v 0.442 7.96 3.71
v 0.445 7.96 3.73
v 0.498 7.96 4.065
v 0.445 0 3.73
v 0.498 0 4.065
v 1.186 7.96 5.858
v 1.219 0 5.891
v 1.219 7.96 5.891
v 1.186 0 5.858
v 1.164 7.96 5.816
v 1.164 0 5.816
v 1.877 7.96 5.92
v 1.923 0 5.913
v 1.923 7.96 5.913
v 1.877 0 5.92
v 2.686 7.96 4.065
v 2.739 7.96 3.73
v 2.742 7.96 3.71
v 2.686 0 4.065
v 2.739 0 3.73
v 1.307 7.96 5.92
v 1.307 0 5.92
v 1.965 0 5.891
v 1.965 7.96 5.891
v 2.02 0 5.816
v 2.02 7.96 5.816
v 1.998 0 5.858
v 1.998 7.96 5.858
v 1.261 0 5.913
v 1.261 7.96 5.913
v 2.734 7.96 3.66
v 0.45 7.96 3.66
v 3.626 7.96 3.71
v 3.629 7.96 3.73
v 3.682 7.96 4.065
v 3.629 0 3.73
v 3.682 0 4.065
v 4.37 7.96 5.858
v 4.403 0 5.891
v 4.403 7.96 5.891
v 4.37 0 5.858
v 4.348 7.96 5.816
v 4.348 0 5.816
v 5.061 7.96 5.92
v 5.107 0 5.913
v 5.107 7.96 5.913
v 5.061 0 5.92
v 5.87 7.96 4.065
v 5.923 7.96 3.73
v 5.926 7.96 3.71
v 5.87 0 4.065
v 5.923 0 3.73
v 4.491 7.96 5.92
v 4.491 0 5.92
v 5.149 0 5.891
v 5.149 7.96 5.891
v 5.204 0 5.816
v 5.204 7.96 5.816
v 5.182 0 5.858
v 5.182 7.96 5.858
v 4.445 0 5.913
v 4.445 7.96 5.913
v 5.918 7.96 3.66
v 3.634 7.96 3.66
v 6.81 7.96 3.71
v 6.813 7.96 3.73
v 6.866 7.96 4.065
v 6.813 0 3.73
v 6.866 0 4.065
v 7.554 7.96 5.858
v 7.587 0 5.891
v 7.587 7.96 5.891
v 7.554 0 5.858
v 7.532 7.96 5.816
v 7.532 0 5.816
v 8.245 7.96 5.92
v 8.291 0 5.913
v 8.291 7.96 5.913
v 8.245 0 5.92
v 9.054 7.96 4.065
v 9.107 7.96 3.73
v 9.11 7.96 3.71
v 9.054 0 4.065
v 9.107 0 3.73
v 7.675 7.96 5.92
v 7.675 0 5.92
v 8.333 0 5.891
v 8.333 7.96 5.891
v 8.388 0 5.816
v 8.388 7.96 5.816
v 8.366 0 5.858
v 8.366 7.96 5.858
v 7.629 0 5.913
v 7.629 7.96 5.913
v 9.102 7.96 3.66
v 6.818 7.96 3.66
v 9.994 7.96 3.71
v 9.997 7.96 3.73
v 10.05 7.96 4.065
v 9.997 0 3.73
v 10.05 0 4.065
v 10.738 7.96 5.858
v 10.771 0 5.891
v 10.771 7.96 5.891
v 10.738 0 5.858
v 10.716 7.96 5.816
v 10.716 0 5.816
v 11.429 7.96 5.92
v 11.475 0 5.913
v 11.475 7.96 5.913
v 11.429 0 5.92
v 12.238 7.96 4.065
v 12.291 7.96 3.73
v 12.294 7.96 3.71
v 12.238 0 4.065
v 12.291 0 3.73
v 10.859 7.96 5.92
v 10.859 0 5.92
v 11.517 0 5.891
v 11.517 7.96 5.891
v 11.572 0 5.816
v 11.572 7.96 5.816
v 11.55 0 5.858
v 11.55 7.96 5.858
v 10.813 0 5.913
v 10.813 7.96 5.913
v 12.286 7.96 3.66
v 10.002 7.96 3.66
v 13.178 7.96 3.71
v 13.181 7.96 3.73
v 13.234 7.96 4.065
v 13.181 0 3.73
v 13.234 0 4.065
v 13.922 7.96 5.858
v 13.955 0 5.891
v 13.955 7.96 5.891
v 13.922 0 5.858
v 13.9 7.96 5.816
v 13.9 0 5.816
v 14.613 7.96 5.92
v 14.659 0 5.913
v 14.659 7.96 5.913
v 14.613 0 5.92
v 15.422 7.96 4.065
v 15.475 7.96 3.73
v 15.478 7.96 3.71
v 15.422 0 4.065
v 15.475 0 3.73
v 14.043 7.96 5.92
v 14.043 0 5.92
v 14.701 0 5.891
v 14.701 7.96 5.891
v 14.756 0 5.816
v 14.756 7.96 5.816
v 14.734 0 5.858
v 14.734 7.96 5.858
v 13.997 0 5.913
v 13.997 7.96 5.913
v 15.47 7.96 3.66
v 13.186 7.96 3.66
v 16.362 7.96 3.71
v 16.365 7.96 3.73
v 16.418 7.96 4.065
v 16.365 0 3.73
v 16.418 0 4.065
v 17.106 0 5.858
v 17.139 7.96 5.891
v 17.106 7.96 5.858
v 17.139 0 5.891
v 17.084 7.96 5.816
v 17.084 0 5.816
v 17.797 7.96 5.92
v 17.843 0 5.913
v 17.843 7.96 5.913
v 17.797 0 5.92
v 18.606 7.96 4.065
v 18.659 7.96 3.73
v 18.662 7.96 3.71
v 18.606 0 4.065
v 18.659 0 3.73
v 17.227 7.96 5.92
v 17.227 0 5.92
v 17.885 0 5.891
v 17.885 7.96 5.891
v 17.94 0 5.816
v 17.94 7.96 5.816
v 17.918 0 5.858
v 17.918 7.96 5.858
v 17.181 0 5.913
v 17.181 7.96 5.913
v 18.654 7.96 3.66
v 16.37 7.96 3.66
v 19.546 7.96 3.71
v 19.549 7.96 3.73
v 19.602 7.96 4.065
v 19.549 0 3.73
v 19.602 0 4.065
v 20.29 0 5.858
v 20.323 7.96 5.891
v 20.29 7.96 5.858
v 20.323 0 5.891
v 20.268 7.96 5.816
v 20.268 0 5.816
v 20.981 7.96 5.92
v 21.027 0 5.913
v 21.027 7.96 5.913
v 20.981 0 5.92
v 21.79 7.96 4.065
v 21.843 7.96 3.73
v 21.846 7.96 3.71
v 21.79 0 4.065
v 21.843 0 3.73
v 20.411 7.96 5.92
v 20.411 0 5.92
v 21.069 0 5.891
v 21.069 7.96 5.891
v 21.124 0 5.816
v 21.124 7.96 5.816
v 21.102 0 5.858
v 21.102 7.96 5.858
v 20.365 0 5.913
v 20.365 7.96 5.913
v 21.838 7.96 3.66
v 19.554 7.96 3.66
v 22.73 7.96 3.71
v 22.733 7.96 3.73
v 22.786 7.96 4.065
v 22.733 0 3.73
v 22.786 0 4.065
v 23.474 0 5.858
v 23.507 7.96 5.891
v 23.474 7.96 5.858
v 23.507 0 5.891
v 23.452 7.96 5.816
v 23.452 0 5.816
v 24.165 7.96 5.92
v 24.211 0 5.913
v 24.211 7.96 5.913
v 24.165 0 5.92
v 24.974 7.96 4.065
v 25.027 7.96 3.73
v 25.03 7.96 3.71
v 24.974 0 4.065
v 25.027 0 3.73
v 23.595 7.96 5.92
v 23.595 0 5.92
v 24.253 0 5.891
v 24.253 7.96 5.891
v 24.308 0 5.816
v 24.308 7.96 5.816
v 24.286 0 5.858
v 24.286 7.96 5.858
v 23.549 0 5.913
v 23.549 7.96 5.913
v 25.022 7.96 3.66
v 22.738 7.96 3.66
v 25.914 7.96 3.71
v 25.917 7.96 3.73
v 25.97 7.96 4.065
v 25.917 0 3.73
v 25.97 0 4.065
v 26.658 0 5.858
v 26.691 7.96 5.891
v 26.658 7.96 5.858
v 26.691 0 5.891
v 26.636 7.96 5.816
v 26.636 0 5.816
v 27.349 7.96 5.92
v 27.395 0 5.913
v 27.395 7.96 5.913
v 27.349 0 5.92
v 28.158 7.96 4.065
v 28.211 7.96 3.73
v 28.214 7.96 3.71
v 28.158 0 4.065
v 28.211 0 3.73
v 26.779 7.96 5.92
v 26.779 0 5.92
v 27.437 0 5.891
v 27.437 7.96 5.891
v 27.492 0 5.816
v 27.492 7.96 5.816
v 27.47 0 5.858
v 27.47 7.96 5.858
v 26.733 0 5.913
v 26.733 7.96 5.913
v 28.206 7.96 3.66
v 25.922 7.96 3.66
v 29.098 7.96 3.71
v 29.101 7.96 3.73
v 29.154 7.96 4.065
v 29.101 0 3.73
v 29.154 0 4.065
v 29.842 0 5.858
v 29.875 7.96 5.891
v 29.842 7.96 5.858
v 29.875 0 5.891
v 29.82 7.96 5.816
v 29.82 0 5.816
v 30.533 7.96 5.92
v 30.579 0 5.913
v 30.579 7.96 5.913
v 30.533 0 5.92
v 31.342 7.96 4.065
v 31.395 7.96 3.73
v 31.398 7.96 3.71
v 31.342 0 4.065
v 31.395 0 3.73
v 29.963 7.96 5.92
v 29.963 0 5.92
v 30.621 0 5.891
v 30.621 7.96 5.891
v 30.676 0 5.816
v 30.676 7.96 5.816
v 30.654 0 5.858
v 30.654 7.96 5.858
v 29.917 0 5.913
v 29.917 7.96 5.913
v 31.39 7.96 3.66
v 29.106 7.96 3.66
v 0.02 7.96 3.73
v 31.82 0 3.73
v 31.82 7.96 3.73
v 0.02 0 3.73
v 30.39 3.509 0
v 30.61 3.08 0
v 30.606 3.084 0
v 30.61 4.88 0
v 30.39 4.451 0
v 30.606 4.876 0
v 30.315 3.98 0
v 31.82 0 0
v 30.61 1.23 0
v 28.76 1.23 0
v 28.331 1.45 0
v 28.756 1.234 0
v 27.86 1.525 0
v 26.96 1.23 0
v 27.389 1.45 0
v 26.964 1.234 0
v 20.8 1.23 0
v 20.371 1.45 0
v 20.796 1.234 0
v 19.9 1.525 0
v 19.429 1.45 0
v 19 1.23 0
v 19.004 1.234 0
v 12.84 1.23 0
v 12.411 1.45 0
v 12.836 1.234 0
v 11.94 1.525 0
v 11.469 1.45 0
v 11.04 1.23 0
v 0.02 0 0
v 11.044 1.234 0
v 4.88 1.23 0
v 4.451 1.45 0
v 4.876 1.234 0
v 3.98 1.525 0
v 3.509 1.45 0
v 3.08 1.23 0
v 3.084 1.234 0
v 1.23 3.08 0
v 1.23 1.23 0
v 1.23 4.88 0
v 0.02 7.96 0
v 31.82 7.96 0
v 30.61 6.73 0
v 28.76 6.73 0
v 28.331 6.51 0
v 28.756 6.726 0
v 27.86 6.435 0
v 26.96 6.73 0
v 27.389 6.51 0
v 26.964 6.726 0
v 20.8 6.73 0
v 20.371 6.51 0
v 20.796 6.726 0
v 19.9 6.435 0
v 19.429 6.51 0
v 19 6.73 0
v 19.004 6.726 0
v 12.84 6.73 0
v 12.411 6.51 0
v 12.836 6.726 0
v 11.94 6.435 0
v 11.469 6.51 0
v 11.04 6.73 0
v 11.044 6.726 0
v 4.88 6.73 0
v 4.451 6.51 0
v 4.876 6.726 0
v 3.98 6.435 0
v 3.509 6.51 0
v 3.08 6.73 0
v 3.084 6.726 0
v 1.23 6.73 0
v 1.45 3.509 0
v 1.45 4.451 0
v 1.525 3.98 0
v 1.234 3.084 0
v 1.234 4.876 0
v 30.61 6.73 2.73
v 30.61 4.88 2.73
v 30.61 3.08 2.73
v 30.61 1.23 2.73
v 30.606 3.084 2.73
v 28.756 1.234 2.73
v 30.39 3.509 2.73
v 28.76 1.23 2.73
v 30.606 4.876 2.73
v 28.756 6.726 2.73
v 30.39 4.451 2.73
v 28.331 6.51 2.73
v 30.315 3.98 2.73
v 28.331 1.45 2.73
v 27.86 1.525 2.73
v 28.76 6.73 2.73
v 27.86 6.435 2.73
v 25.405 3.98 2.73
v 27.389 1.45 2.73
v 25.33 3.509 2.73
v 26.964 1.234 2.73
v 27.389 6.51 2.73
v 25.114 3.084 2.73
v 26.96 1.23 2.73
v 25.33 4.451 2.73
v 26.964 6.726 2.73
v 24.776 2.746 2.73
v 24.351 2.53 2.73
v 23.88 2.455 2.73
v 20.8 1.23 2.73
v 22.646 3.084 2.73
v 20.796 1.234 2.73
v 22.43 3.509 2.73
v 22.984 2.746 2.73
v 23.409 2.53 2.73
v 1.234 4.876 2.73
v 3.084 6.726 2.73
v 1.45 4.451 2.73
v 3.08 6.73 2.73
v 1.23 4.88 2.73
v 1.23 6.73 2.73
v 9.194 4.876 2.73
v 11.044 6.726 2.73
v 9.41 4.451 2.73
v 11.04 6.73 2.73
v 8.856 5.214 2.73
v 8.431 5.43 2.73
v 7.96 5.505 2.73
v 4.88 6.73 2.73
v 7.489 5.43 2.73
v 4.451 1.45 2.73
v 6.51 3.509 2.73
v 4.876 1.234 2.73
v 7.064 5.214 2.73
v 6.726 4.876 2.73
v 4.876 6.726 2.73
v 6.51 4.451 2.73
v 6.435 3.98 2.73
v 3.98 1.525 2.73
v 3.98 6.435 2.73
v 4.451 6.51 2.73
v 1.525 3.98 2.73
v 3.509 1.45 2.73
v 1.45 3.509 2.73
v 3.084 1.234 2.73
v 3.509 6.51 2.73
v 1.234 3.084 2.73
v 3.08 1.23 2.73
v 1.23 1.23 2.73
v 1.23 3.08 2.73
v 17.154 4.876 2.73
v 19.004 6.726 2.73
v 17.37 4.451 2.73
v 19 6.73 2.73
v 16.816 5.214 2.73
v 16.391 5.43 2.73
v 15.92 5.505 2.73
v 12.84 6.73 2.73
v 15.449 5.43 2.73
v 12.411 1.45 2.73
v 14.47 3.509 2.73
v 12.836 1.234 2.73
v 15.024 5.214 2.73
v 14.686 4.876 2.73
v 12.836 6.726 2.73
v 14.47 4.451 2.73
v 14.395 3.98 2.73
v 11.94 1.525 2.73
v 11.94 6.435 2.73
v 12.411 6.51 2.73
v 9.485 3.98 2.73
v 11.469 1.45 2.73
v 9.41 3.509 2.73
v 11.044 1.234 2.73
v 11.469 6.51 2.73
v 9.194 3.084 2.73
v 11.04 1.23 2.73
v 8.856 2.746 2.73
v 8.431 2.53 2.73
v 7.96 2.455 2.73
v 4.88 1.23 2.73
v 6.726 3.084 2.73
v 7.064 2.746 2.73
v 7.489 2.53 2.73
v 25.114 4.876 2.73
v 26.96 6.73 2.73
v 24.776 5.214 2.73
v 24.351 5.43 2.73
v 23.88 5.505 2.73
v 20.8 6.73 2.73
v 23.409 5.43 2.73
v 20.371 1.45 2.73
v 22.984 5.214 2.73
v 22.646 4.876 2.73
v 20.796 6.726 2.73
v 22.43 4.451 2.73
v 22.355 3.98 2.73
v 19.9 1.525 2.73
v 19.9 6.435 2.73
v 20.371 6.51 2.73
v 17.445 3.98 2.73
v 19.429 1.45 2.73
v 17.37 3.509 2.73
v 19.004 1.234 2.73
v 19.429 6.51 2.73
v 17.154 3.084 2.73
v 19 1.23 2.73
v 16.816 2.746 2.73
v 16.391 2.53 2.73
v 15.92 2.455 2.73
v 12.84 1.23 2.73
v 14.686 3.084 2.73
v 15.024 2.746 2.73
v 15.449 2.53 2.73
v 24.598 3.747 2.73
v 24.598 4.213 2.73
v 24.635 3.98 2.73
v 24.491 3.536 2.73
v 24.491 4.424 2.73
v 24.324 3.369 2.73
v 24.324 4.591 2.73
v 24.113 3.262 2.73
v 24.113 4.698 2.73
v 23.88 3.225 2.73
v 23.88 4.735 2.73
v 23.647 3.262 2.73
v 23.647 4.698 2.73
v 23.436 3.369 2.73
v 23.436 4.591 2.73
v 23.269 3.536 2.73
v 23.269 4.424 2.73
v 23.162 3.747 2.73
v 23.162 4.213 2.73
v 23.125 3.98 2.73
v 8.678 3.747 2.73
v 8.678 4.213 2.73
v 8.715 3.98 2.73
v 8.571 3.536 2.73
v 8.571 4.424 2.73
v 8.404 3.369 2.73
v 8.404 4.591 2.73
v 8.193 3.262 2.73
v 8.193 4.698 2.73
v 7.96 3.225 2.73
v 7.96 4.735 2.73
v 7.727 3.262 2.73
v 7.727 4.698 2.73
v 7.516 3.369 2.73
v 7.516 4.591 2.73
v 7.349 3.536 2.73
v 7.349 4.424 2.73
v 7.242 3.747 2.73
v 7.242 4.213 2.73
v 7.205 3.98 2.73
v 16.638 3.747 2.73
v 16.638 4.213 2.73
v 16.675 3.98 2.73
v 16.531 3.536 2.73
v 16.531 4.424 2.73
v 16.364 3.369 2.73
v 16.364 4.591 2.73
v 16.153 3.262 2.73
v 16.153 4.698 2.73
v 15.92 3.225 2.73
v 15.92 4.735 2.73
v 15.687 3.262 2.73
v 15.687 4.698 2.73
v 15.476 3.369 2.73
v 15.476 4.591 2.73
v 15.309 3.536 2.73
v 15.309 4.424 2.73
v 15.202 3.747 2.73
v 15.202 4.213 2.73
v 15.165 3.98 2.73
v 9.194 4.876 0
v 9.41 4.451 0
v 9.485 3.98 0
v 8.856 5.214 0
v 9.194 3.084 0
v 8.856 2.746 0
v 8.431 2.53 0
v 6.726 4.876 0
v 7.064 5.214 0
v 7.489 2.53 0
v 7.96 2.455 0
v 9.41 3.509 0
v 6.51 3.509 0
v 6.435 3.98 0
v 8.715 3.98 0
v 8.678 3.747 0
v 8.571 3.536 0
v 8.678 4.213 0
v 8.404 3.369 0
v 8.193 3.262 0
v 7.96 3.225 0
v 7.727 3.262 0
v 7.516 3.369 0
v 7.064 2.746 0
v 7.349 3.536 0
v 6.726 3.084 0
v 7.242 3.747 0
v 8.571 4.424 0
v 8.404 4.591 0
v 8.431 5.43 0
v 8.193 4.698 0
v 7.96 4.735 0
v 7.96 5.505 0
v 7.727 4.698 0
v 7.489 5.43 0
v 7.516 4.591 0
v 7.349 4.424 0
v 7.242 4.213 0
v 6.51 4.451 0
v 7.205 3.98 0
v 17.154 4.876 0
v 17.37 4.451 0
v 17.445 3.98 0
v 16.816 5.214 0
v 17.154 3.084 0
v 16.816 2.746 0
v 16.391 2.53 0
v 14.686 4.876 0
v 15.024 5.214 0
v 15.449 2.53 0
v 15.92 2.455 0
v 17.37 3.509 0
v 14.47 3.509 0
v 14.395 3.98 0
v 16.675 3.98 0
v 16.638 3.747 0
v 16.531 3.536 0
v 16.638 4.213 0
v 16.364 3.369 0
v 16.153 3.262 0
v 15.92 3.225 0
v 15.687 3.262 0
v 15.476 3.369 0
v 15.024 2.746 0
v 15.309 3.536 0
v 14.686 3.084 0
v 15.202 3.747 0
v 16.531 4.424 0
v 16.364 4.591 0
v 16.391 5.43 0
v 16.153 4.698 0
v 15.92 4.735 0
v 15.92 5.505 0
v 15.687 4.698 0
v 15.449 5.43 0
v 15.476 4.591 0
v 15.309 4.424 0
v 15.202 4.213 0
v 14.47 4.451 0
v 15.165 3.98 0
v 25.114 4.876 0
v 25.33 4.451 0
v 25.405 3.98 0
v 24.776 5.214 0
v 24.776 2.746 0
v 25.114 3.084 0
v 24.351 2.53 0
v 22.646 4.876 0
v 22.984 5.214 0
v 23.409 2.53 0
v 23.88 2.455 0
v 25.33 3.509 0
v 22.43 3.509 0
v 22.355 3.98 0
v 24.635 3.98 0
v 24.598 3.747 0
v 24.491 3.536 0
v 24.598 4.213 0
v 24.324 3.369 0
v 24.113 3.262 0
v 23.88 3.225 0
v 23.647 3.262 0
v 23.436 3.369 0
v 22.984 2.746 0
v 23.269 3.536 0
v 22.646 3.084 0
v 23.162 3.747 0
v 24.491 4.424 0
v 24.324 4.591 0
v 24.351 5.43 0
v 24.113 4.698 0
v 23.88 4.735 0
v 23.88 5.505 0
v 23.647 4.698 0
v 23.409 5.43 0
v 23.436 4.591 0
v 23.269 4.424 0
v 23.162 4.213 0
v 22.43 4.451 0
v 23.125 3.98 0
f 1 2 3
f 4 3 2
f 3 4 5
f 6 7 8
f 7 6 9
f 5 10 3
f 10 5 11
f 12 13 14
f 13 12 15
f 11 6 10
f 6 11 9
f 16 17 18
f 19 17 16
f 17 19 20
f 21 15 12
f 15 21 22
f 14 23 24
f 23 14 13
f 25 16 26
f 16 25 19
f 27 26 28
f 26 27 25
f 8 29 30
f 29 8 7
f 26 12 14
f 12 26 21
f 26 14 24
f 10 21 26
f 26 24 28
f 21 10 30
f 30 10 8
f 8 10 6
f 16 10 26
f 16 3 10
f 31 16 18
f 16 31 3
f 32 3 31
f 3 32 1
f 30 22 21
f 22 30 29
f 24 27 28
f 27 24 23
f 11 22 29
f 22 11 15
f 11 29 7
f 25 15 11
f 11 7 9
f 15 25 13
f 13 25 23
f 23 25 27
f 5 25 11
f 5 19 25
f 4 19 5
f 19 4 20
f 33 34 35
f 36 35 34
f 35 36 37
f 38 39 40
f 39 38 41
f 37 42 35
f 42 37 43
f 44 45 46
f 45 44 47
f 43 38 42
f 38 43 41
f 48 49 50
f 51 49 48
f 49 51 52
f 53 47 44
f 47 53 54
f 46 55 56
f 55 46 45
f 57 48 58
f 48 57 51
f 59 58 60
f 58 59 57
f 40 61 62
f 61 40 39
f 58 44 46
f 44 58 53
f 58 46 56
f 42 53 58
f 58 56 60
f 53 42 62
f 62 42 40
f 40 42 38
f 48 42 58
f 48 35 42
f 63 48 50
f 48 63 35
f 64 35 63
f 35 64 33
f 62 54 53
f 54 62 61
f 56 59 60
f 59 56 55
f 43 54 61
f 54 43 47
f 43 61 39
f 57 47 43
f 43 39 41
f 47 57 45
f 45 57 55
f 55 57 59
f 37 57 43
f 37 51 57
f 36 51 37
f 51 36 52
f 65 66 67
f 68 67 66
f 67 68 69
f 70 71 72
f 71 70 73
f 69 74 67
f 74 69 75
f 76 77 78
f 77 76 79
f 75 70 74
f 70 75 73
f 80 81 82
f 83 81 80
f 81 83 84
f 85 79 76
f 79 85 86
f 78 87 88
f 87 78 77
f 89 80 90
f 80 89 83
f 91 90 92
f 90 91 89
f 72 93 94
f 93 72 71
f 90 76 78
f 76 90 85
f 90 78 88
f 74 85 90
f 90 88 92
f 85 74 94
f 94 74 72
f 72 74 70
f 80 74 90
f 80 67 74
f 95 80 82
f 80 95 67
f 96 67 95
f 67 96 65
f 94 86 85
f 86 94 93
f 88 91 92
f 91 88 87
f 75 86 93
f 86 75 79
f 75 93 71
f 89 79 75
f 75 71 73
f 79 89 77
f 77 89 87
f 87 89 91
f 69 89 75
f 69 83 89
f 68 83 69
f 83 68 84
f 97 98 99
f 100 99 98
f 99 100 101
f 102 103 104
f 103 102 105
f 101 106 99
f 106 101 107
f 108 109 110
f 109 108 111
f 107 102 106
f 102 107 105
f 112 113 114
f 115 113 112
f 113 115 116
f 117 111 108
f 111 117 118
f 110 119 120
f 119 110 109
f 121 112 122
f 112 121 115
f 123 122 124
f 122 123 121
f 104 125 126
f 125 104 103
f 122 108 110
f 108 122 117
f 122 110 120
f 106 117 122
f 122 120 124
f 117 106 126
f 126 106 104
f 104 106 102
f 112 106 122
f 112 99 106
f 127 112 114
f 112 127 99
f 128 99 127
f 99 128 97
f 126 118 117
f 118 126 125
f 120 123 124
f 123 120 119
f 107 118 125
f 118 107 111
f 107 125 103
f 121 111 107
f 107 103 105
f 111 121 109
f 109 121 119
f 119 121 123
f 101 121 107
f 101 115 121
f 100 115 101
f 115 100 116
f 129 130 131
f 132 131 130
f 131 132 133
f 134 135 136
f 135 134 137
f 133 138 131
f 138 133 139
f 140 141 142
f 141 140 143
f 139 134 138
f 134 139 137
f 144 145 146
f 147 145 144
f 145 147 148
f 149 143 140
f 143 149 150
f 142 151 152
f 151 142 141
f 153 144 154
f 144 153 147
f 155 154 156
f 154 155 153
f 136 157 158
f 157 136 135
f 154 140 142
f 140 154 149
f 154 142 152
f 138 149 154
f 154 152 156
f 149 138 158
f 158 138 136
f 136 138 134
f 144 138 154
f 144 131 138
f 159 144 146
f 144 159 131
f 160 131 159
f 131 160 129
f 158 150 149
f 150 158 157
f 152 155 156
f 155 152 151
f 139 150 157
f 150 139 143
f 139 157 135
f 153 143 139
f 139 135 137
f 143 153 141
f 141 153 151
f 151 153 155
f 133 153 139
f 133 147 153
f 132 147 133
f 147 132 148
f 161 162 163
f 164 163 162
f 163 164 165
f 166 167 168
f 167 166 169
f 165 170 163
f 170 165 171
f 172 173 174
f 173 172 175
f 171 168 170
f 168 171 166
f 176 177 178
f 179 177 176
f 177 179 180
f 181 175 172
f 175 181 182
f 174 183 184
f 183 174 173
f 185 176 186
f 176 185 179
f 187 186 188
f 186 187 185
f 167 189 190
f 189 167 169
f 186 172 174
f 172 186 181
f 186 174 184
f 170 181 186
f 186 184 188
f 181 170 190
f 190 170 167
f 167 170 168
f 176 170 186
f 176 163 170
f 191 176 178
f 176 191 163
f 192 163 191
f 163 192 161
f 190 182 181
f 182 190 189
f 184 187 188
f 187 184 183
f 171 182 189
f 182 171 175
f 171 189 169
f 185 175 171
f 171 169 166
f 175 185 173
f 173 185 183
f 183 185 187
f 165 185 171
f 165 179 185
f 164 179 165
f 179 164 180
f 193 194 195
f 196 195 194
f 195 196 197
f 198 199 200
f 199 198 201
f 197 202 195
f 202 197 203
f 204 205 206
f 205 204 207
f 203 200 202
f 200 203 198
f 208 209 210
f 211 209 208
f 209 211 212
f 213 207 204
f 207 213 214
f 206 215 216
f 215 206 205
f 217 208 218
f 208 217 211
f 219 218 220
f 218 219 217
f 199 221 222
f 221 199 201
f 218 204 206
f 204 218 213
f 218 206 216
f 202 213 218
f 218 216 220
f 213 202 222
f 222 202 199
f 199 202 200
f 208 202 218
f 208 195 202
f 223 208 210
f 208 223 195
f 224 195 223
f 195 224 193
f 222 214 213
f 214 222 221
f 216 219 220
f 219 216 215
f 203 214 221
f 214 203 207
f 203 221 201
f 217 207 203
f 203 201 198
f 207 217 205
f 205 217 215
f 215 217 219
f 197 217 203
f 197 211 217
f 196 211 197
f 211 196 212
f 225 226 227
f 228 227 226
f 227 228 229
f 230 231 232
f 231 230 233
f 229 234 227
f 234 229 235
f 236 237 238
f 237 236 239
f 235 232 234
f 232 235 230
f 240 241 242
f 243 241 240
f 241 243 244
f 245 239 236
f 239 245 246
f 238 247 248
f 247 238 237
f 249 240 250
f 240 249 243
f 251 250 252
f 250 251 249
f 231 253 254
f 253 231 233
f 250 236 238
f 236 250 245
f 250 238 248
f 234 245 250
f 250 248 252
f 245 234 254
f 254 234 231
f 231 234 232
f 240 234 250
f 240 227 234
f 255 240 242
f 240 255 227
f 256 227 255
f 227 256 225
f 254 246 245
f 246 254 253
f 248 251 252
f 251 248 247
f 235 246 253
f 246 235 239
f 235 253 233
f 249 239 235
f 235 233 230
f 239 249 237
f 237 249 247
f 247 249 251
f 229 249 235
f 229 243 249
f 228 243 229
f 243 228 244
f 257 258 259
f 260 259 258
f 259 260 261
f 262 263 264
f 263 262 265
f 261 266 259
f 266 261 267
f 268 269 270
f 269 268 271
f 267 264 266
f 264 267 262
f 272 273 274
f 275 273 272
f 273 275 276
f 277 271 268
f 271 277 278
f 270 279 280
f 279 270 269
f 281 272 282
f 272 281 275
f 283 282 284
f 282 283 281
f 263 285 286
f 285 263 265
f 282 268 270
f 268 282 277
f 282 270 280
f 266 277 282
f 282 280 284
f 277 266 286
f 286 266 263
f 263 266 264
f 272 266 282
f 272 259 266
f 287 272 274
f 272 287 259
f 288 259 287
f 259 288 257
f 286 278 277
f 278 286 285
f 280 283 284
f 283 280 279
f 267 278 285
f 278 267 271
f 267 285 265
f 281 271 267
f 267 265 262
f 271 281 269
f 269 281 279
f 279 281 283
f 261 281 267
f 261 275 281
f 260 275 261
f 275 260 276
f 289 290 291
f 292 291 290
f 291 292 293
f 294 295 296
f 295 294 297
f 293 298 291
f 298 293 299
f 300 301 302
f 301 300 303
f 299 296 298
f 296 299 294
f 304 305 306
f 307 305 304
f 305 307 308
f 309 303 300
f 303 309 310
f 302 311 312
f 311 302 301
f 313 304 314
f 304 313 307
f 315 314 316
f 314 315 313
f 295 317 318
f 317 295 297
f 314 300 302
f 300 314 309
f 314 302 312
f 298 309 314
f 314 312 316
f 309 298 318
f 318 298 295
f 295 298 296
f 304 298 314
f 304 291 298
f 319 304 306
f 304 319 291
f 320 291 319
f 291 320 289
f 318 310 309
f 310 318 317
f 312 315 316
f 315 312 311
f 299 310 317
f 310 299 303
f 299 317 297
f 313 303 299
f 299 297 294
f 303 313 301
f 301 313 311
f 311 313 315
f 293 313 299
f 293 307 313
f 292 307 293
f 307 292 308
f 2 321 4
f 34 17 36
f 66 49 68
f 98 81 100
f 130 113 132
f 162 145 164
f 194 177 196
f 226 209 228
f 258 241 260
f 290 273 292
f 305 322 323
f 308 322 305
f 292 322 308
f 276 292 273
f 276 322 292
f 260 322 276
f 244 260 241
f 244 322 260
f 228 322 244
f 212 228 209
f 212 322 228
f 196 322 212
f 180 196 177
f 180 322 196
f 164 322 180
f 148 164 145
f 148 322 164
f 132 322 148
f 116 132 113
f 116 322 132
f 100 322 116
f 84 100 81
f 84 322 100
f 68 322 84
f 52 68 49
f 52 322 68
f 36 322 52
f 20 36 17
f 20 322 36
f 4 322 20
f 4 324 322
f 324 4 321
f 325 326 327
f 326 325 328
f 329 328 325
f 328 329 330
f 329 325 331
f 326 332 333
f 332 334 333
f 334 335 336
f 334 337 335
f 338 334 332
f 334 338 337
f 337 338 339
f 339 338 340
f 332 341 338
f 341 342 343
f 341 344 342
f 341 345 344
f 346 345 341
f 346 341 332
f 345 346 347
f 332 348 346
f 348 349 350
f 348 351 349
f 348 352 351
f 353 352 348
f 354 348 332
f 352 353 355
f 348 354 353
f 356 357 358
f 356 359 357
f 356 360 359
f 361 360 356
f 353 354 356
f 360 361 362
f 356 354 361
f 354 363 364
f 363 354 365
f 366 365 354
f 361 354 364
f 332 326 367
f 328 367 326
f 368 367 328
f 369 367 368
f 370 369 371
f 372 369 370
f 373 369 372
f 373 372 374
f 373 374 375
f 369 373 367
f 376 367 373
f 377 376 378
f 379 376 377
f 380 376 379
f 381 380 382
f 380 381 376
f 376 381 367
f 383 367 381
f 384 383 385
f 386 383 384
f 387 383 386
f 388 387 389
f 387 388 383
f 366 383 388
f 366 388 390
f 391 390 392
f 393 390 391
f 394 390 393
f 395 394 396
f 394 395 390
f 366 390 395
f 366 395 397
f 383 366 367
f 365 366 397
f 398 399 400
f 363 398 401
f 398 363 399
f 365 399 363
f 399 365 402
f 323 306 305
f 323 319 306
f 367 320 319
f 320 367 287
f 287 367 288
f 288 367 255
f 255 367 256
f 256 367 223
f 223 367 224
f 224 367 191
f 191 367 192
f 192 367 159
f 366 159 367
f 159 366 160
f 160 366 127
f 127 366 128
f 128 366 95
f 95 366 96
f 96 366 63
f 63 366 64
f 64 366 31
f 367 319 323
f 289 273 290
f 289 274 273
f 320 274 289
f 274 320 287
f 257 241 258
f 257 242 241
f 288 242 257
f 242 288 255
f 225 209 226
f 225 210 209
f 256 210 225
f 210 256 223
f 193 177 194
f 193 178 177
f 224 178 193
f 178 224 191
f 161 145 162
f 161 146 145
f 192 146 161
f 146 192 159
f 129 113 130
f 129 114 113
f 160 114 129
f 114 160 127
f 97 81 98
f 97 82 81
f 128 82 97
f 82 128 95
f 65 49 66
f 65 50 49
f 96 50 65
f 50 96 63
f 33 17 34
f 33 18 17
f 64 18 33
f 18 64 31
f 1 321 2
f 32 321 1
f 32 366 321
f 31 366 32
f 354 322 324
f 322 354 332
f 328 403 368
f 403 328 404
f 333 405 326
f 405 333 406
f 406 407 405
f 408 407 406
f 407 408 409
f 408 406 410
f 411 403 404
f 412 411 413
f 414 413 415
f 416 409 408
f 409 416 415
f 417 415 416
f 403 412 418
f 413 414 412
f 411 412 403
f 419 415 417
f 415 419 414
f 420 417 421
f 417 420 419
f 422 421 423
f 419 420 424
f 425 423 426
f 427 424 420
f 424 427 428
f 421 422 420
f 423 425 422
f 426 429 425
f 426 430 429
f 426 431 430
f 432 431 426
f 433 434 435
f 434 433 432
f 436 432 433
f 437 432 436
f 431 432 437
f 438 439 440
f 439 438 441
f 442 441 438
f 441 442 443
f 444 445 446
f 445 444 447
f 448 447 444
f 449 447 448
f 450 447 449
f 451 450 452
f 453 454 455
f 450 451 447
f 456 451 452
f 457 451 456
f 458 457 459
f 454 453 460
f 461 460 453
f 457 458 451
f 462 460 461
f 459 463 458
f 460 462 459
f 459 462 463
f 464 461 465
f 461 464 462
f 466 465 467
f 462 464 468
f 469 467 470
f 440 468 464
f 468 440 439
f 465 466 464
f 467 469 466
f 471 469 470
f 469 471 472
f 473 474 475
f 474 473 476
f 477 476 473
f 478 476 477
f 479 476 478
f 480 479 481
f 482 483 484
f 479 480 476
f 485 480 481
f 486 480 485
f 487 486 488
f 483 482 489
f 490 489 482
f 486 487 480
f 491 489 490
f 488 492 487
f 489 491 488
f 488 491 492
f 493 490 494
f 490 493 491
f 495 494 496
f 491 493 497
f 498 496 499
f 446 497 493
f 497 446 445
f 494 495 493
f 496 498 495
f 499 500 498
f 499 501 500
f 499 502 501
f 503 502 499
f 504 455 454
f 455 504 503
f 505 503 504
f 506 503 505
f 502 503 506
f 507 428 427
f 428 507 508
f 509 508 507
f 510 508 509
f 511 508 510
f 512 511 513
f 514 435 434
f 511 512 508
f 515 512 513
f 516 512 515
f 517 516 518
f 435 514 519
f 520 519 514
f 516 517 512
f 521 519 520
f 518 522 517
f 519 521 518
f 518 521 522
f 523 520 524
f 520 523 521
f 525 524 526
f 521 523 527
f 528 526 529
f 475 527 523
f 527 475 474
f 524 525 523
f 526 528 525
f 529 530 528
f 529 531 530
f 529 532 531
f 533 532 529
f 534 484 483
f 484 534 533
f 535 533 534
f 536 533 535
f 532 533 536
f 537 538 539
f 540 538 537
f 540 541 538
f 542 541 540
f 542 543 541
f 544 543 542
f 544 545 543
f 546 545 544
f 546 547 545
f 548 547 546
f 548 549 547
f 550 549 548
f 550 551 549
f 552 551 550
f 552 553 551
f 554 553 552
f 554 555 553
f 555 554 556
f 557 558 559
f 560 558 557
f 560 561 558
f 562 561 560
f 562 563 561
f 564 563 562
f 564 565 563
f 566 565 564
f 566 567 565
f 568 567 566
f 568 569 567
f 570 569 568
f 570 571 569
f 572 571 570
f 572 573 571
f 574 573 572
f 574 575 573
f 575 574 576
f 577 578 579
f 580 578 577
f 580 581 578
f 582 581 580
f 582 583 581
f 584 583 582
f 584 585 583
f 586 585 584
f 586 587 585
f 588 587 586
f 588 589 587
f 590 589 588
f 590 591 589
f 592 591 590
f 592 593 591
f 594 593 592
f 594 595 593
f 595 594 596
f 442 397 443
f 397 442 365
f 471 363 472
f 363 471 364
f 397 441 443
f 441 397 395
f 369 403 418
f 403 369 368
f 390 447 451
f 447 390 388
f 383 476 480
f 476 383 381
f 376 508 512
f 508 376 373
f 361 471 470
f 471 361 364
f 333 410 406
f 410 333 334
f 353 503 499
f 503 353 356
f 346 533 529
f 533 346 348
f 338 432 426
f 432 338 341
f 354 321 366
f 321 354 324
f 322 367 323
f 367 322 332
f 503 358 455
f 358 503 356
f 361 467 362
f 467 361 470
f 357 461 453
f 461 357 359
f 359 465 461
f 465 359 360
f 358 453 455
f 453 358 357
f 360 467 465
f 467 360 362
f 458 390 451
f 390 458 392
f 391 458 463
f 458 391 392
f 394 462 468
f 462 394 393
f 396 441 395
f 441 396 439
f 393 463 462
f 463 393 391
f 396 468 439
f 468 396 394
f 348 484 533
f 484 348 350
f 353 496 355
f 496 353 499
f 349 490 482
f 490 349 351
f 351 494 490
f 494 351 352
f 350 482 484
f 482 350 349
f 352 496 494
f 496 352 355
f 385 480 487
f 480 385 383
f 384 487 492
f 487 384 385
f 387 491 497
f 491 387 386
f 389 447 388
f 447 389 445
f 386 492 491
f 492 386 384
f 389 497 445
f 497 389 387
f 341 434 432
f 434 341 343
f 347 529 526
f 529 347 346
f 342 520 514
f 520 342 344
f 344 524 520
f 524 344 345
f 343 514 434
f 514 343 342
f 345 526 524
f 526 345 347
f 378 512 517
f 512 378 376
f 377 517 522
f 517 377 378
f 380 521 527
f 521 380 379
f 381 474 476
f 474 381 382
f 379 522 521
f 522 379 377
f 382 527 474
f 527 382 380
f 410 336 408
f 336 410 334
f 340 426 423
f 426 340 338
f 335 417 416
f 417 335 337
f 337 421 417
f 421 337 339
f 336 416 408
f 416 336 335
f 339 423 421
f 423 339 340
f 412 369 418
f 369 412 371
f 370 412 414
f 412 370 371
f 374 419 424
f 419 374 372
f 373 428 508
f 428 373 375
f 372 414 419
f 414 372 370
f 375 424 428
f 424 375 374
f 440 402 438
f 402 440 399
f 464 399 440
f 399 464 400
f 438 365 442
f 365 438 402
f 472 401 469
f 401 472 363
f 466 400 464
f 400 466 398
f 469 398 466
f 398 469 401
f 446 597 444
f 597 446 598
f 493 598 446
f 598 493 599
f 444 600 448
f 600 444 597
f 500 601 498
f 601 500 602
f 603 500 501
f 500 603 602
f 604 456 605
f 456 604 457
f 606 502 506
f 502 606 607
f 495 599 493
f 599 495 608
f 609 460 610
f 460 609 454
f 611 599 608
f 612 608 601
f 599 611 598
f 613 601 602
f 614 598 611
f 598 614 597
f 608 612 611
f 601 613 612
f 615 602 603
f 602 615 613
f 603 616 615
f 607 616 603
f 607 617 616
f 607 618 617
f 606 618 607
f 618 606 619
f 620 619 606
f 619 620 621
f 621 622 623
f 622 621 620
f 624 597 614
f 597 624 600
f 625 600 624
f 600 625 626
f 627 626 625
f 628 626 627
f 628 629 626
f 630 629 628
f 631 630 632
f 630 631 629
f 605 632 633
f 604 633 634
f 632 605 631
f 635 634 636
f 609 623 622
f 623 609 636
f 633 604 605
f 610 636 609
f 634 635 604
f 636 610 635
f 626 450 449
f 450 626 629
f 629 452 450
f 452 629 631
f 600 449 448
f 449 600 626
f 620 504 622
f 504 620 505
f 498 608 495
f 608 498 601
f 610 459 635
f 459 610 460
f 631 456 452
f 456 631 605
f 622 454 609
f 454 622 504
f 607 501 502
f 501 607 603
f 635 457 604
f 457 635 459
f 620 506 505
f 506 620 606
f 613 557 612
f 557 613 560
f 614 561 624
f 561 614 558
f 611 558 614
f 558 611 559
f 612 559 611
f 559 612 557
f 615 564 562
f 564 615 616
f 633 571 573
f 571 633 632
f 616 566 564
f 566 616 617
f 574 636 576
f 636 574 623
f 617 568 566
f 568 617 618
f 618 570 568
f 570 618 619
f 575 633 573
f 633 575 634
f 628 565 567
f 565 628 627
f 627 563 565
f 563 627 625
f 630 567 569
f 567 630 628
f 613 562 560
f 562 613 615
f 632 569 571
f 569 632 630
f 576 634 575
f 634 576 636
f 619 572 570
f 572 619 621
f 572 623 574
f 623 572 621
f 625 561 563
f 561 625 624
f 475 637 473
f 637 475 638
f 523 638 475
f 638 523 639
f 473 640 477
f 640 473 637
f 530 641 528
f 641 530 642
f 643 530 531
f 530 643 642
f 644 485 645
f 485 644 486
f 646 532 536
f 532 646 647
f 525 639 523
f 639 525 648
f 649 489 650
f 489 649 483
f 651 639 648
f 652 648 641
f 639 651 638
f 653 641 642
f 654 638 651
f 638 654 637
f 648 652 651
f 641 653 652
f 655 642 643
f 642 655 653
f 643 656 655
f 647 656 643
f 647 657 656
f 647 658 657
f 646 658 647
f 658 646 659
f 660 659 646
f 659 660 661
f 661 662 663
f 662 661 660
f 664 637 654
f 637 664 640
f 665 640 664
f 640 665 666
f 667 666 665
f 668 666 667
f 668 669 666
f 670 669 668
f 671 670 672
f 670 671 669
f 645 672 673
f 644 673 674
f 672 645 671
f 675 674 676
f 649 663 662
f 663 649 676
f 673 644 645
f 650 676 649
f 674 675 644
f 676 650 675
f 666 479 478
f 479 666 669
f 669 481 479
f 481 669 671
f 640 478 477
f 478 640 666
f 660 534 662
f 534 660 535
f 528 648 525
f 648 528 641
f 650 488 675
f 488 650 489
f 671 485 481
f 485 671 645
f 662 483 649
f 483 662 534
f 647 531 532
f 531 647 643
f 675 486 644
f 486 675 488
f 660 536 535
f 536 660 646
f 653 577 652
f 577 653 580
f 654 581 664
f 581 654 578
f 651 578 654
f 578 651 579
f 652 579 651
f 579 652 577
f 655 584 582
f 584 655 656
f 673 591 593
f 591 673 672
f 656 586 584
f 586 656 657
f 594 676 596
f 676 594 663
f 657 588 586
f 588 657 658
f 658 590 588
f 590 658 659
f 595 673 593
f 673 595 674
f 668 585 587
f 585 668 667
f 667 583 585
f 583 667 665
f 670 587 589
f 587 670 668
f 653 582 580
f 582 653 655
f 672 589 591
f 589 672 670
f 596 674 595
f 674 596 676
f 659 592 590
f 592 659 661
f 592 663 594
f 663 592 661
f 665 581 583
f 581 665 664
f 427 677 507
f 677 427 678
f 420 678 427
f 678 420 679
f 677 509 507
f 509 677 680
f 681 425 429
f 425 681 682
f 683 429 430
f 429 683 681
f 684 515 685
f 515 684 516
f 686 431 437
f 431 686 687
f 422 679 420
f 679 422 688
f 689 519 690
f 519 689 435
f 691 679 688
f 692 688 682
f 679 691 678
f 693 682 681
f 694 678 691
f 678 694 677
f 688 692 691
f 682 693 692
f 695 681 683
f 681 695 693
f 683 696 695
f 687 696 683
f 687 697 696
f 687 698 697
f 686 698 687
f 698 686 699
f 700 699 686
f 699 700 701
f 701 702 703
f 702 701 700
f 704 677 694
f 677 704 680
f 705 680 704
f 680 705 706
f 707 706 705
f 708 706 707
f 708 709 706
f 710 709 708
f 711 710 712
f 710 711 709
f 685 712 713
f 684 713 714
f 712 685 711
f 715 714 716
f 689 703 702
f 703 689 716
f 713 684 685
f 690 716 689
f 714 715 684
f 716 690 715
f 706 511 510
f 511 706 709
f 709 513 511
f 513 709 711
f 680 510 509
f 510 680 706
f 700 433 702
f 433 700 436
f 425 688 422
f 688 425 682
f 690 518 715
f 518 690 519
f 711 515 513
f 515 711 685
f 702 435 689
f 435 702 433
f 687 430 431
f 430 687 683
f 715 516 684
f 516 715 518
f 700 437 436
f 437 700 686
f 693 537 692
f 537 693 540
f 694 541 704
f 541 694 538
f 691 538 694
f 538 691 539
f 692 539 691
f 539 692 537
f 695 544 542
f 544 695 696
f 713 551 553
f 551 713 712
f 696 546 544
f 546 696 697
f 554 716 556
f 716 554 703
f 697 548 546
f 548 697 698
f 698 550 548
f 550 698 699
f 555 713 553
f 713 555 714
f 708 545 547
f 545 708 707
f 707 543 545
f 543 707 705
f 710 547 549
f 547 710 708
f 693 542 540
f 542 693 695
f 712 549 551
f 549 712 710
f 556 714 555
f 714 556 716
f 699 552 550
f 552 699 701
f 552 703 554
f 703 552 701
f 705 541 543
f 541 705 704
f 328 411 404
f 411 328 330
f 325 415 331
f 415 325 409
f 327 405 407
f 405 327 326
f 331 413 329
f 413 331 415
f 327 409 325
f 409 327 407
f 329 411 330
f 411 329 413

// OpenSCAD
width_in_studs  = 1;
length_in_studs = 4;

module tooth() {
  $fn = 20;
  brick_height        = 9.64;
  brick_width         = 7.96;
  stud_diameter       = 4.88;
  stud_height         = 1.82;
  plate_height        = brick_height/3;
  wall_thickness      = 1.23;
  height_in_plates    = 1;
  tooth_base_width    = 2.3;
  tooth_tip_width     = 0.87;
  tooth_height        = 2.06;
  tooth_top           = 5.79;
  tooth_tip_radius    = 0.15;
  teeth_per_brick     = 2.5;
  half_pegs_per_brick = 2;
  gap_width           = 0.884;
  peg_diam            = 3.05;
  inner_peg_diam      = 1.51;

  //render()
  x_a = -((tooth_tip_width/2) - tooth_tip_radius);
  x_b = (tooth_tip_width/2) - tooth_tip_radius;
  translate([(gap_width+tooth_base_width)/2,0,0.65])
  rotate([0,0,180])
  translate([0,-(brick_width * width_in_studs)/2,tooth_height + 1]) {
    difference() {
      hull() {
        translate([x_a,0,tooth_height]) rotate([90,0,0]) cylinder(r=tooth_tip_radius,   h=(brick_width * width_in_studs), center=true);
        translate([x_b,0,tooth_height]) rotate([90,0,0]) cylinder(r=tooth_tip_radius,   h=(brick_width * width_in_studs), center=true);
        translate([0,0,0])              rotate([90,0,0]) cylinder(r=tooth_base_width/2, h=(brick_width * width_in_studs), center=true);
      }
      translate([0,0,-1]) cube(size=[gap_width + tooth_base_width, brick_width * width_in_studs + 1, 1.9], center=true);
    }
  }
}

module peg() {
  $fn = 20;
  brick_height        = 9.64;
  brick_width         = 7.96;
  stud_diameter       = 4.88;
  stud_height         = 1.82;
  plate_height        = brick_height/3;
  wall_thickness      = 1.23;
  height_in_plates    = 1;
  tooth_base_width    = 2.3;
  tooth_tip_width     = 0.87;
  tooth_height        = 2.06;
  tooth_top           = 5.79;
  tooth_tip_radius    = 0.15;
  teeth_per_brick     = 2.5;
  half_pegs_per_brick = 2;
  gap_width           = 0.884;
  peg_diam            = 3.05;
  inner_peg_diam      = 1.51;

  difference() {
    difference() {
      translate([0,(brick_width/2),(2.73/2)]) cylinder(r=(peg_diam/2), h=2.73, center=true);
      translate([0,(brick_width/2),(2.73/2)]) cylinder(r=inner_peg_diam/2, h=10, center=true);
    }
  }
}


module rack() {
  brick_height        = 9.64;
  brick_width         = 7.96;
  stud_diameter       = 4.88;
  stud_height         = 1.82;
  plate_height        = brick_height/3;
  wall_thickness      = 1.23;
  height_in_plates    = 1;
  tooth_base_width    = 2.3;
  tooth_tip_width     = 0.87;
  tooth_height        = 2.06;
  tooth_top           = 5.79;
  tooth_tip_radius    = 0.15;
  teeth_per_brick     = 2.5;
  half_pegs_per_brick = 2;
  gap_width           = 0.884;
  peg_diam            = 3.05;
  inner_peg_diam      = 1.51;

  teeth       = (length_in_studs * teeth_per_brick);
  tooth_width = tooth_base_width + gap_width;
  shift       = length_in_studs * (teeth_per_brick * tooth_width)/2;
  base_length = (length_in_studs * brick_width)/2;

  for ( i = [0 : teeth-1]) {
    translate([i * (tooth_base_width + gap_width), 0, 0]) tooth();
  }

  difference() {
    cube(size=[(brick_width * length_in_studs), (brick_width * width_in_studs), 3.73]);
    translate([wall_thickness,wall_thickness,-1]) cube(size=[(brick_width * length_in_studs) - (wall_thickness*2), (brick_width * width_in_studs) - (wall_thickness*2), 3.73]);
    // shave a bit off the beginning and end of the brick
    translate([-1.98,-1,0]) cube(size=[2, (brick_width * width_in_studs)+2, 10]);
    translate([(brick_width * length_in_studs) - 0.02,-1,0]) cube(size=[2, (brick_width * length_in_studs)+2, 10]);
  }

  peg_rows = (length_in_studs * half_pegs_per_brick/2);
  peg_cols = (width_in_studs * half_pegs_per_brick/2);

  difference() {
    union() {
      translate([brick_width/2,-brick_width/2,0])
      for ( row = [0 : peg_rows-1]) {
        for ( col = [0 : peg_cols]) {
          translate([row * brick_width, col * brick_width, 0]) peg();
        }
      }

      translate([0,0,0])
      for ( row = [0 : peg_rows]) {
        for ( col = [0 : peg_cols-1]) {
          translate([row * brick_width, col * brick_width, 0]) peg();
        }
      }
    }
    //chop off excess pegs on the walls
    difference() {
      translate([-2,-2,-1]) cube(size=[(brick_width * length_in_studs)+4, (brick_width * width_in_studs)+4, 10]);
      translate([wall_thickness,wall_thickness,-2]) cube(size=[(brick_width * length_in_studs) - (wall_thickness*2), (brick_width * width_in_studs) - (wall_thickness*2), 10]);
    }
  }
}

rack();
